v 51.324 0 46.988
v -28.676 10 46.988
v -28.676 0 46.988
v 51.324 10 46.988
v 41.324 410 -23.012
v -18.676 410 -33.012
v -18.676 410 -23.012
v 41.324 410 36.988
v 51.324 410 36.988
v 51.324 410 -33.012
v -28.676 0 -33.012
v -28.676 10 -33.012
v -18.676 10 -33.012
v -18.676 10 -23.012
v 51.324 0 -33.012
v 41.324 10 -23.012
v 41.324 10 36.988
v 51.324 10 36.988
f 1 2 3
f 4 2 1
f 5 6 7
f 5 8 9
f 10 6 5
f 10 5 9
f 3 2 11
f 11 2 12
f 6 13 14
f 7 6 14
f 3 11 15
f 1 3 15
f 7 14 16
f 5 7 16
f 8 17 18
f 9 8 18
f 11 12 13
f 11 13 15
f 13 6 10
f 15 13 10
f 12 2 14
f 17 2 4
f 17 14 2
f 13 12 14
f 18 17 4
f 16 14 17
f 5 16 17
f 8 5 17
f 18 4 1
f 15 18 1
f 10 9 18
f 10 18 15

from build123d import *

# Parameters (mm, degrees)
SKETCH_1_W           = 100
SKETCH_1_H           = 100
EXTRUDE_1_DEPTH      = 10
EXTRUDE_2_DEPTH      = 400
SKETCH_3_OUTSIDE_W   = 188.74
SKETCH_3_OUTSIDE_H   = 188.74
SKETCH_3_OUTSIDE_W_2 = 80
SKETCH_3_OUTSIDE_H_2 = 80
CUT_EXTRUDE_1_DEPTH  = 400


with BuildPart() as part:
    # 草图1 → 凸台-拉伸1 (new body)
    with BuildSketch(Plane(origin=(0, 0, 0), x_dir=(1, 0, 0), z_dir=(0, 1, 0))):
        with Locations((11.323542268, -6.987712791)):
            Rectangle(SKETCH_1_W, SKETCH_1_H)
    extrude(amount=EXTRUDE_1_DEPTH)

    # 草图2 → 凸台-拉伸2 (add)
    with BuildSketch(Plane(origin=(0, 10, 0), x_dir=(1, 0, 0), z_dir=(0, 1, 0))):
        Polygon((51.323542268, 33.012287209), (-18.676457732, 33.012287209), (-18.676457732, 23.012287209), (41.323542268, 23.012287209), (41.323542268, -36.987712791), (51.323542268, -36.987712791), align=None)
    extrude(amount=EXTRUDE_2_DEPTH)

    # 草图3 outside → 切除-拉伸1 (cut)
    with BuildSketch(Plane(origin=(0, 10, 0), x_dir=(1, 0, 0), z_dir=(0, 1, 0))):
        with Locations((11.324, -6.988)):
            Rectangle(SKETCH_3_OUTSIDE_W, SKETCH_3_OUTSIDE_H)
        with Locations((11.323542268, -6.987712791)):
            Rectangle(SKETCH_3_OUTSIDE_W_2, SKETCH_3_OUTSIDE_H_2, mode=Mode.SUBTRACT)
    extrude(amount=-CUT_EXTRUDE_1_DEPTH, mode=Mode.SUBTRACT)


solid = part.part
